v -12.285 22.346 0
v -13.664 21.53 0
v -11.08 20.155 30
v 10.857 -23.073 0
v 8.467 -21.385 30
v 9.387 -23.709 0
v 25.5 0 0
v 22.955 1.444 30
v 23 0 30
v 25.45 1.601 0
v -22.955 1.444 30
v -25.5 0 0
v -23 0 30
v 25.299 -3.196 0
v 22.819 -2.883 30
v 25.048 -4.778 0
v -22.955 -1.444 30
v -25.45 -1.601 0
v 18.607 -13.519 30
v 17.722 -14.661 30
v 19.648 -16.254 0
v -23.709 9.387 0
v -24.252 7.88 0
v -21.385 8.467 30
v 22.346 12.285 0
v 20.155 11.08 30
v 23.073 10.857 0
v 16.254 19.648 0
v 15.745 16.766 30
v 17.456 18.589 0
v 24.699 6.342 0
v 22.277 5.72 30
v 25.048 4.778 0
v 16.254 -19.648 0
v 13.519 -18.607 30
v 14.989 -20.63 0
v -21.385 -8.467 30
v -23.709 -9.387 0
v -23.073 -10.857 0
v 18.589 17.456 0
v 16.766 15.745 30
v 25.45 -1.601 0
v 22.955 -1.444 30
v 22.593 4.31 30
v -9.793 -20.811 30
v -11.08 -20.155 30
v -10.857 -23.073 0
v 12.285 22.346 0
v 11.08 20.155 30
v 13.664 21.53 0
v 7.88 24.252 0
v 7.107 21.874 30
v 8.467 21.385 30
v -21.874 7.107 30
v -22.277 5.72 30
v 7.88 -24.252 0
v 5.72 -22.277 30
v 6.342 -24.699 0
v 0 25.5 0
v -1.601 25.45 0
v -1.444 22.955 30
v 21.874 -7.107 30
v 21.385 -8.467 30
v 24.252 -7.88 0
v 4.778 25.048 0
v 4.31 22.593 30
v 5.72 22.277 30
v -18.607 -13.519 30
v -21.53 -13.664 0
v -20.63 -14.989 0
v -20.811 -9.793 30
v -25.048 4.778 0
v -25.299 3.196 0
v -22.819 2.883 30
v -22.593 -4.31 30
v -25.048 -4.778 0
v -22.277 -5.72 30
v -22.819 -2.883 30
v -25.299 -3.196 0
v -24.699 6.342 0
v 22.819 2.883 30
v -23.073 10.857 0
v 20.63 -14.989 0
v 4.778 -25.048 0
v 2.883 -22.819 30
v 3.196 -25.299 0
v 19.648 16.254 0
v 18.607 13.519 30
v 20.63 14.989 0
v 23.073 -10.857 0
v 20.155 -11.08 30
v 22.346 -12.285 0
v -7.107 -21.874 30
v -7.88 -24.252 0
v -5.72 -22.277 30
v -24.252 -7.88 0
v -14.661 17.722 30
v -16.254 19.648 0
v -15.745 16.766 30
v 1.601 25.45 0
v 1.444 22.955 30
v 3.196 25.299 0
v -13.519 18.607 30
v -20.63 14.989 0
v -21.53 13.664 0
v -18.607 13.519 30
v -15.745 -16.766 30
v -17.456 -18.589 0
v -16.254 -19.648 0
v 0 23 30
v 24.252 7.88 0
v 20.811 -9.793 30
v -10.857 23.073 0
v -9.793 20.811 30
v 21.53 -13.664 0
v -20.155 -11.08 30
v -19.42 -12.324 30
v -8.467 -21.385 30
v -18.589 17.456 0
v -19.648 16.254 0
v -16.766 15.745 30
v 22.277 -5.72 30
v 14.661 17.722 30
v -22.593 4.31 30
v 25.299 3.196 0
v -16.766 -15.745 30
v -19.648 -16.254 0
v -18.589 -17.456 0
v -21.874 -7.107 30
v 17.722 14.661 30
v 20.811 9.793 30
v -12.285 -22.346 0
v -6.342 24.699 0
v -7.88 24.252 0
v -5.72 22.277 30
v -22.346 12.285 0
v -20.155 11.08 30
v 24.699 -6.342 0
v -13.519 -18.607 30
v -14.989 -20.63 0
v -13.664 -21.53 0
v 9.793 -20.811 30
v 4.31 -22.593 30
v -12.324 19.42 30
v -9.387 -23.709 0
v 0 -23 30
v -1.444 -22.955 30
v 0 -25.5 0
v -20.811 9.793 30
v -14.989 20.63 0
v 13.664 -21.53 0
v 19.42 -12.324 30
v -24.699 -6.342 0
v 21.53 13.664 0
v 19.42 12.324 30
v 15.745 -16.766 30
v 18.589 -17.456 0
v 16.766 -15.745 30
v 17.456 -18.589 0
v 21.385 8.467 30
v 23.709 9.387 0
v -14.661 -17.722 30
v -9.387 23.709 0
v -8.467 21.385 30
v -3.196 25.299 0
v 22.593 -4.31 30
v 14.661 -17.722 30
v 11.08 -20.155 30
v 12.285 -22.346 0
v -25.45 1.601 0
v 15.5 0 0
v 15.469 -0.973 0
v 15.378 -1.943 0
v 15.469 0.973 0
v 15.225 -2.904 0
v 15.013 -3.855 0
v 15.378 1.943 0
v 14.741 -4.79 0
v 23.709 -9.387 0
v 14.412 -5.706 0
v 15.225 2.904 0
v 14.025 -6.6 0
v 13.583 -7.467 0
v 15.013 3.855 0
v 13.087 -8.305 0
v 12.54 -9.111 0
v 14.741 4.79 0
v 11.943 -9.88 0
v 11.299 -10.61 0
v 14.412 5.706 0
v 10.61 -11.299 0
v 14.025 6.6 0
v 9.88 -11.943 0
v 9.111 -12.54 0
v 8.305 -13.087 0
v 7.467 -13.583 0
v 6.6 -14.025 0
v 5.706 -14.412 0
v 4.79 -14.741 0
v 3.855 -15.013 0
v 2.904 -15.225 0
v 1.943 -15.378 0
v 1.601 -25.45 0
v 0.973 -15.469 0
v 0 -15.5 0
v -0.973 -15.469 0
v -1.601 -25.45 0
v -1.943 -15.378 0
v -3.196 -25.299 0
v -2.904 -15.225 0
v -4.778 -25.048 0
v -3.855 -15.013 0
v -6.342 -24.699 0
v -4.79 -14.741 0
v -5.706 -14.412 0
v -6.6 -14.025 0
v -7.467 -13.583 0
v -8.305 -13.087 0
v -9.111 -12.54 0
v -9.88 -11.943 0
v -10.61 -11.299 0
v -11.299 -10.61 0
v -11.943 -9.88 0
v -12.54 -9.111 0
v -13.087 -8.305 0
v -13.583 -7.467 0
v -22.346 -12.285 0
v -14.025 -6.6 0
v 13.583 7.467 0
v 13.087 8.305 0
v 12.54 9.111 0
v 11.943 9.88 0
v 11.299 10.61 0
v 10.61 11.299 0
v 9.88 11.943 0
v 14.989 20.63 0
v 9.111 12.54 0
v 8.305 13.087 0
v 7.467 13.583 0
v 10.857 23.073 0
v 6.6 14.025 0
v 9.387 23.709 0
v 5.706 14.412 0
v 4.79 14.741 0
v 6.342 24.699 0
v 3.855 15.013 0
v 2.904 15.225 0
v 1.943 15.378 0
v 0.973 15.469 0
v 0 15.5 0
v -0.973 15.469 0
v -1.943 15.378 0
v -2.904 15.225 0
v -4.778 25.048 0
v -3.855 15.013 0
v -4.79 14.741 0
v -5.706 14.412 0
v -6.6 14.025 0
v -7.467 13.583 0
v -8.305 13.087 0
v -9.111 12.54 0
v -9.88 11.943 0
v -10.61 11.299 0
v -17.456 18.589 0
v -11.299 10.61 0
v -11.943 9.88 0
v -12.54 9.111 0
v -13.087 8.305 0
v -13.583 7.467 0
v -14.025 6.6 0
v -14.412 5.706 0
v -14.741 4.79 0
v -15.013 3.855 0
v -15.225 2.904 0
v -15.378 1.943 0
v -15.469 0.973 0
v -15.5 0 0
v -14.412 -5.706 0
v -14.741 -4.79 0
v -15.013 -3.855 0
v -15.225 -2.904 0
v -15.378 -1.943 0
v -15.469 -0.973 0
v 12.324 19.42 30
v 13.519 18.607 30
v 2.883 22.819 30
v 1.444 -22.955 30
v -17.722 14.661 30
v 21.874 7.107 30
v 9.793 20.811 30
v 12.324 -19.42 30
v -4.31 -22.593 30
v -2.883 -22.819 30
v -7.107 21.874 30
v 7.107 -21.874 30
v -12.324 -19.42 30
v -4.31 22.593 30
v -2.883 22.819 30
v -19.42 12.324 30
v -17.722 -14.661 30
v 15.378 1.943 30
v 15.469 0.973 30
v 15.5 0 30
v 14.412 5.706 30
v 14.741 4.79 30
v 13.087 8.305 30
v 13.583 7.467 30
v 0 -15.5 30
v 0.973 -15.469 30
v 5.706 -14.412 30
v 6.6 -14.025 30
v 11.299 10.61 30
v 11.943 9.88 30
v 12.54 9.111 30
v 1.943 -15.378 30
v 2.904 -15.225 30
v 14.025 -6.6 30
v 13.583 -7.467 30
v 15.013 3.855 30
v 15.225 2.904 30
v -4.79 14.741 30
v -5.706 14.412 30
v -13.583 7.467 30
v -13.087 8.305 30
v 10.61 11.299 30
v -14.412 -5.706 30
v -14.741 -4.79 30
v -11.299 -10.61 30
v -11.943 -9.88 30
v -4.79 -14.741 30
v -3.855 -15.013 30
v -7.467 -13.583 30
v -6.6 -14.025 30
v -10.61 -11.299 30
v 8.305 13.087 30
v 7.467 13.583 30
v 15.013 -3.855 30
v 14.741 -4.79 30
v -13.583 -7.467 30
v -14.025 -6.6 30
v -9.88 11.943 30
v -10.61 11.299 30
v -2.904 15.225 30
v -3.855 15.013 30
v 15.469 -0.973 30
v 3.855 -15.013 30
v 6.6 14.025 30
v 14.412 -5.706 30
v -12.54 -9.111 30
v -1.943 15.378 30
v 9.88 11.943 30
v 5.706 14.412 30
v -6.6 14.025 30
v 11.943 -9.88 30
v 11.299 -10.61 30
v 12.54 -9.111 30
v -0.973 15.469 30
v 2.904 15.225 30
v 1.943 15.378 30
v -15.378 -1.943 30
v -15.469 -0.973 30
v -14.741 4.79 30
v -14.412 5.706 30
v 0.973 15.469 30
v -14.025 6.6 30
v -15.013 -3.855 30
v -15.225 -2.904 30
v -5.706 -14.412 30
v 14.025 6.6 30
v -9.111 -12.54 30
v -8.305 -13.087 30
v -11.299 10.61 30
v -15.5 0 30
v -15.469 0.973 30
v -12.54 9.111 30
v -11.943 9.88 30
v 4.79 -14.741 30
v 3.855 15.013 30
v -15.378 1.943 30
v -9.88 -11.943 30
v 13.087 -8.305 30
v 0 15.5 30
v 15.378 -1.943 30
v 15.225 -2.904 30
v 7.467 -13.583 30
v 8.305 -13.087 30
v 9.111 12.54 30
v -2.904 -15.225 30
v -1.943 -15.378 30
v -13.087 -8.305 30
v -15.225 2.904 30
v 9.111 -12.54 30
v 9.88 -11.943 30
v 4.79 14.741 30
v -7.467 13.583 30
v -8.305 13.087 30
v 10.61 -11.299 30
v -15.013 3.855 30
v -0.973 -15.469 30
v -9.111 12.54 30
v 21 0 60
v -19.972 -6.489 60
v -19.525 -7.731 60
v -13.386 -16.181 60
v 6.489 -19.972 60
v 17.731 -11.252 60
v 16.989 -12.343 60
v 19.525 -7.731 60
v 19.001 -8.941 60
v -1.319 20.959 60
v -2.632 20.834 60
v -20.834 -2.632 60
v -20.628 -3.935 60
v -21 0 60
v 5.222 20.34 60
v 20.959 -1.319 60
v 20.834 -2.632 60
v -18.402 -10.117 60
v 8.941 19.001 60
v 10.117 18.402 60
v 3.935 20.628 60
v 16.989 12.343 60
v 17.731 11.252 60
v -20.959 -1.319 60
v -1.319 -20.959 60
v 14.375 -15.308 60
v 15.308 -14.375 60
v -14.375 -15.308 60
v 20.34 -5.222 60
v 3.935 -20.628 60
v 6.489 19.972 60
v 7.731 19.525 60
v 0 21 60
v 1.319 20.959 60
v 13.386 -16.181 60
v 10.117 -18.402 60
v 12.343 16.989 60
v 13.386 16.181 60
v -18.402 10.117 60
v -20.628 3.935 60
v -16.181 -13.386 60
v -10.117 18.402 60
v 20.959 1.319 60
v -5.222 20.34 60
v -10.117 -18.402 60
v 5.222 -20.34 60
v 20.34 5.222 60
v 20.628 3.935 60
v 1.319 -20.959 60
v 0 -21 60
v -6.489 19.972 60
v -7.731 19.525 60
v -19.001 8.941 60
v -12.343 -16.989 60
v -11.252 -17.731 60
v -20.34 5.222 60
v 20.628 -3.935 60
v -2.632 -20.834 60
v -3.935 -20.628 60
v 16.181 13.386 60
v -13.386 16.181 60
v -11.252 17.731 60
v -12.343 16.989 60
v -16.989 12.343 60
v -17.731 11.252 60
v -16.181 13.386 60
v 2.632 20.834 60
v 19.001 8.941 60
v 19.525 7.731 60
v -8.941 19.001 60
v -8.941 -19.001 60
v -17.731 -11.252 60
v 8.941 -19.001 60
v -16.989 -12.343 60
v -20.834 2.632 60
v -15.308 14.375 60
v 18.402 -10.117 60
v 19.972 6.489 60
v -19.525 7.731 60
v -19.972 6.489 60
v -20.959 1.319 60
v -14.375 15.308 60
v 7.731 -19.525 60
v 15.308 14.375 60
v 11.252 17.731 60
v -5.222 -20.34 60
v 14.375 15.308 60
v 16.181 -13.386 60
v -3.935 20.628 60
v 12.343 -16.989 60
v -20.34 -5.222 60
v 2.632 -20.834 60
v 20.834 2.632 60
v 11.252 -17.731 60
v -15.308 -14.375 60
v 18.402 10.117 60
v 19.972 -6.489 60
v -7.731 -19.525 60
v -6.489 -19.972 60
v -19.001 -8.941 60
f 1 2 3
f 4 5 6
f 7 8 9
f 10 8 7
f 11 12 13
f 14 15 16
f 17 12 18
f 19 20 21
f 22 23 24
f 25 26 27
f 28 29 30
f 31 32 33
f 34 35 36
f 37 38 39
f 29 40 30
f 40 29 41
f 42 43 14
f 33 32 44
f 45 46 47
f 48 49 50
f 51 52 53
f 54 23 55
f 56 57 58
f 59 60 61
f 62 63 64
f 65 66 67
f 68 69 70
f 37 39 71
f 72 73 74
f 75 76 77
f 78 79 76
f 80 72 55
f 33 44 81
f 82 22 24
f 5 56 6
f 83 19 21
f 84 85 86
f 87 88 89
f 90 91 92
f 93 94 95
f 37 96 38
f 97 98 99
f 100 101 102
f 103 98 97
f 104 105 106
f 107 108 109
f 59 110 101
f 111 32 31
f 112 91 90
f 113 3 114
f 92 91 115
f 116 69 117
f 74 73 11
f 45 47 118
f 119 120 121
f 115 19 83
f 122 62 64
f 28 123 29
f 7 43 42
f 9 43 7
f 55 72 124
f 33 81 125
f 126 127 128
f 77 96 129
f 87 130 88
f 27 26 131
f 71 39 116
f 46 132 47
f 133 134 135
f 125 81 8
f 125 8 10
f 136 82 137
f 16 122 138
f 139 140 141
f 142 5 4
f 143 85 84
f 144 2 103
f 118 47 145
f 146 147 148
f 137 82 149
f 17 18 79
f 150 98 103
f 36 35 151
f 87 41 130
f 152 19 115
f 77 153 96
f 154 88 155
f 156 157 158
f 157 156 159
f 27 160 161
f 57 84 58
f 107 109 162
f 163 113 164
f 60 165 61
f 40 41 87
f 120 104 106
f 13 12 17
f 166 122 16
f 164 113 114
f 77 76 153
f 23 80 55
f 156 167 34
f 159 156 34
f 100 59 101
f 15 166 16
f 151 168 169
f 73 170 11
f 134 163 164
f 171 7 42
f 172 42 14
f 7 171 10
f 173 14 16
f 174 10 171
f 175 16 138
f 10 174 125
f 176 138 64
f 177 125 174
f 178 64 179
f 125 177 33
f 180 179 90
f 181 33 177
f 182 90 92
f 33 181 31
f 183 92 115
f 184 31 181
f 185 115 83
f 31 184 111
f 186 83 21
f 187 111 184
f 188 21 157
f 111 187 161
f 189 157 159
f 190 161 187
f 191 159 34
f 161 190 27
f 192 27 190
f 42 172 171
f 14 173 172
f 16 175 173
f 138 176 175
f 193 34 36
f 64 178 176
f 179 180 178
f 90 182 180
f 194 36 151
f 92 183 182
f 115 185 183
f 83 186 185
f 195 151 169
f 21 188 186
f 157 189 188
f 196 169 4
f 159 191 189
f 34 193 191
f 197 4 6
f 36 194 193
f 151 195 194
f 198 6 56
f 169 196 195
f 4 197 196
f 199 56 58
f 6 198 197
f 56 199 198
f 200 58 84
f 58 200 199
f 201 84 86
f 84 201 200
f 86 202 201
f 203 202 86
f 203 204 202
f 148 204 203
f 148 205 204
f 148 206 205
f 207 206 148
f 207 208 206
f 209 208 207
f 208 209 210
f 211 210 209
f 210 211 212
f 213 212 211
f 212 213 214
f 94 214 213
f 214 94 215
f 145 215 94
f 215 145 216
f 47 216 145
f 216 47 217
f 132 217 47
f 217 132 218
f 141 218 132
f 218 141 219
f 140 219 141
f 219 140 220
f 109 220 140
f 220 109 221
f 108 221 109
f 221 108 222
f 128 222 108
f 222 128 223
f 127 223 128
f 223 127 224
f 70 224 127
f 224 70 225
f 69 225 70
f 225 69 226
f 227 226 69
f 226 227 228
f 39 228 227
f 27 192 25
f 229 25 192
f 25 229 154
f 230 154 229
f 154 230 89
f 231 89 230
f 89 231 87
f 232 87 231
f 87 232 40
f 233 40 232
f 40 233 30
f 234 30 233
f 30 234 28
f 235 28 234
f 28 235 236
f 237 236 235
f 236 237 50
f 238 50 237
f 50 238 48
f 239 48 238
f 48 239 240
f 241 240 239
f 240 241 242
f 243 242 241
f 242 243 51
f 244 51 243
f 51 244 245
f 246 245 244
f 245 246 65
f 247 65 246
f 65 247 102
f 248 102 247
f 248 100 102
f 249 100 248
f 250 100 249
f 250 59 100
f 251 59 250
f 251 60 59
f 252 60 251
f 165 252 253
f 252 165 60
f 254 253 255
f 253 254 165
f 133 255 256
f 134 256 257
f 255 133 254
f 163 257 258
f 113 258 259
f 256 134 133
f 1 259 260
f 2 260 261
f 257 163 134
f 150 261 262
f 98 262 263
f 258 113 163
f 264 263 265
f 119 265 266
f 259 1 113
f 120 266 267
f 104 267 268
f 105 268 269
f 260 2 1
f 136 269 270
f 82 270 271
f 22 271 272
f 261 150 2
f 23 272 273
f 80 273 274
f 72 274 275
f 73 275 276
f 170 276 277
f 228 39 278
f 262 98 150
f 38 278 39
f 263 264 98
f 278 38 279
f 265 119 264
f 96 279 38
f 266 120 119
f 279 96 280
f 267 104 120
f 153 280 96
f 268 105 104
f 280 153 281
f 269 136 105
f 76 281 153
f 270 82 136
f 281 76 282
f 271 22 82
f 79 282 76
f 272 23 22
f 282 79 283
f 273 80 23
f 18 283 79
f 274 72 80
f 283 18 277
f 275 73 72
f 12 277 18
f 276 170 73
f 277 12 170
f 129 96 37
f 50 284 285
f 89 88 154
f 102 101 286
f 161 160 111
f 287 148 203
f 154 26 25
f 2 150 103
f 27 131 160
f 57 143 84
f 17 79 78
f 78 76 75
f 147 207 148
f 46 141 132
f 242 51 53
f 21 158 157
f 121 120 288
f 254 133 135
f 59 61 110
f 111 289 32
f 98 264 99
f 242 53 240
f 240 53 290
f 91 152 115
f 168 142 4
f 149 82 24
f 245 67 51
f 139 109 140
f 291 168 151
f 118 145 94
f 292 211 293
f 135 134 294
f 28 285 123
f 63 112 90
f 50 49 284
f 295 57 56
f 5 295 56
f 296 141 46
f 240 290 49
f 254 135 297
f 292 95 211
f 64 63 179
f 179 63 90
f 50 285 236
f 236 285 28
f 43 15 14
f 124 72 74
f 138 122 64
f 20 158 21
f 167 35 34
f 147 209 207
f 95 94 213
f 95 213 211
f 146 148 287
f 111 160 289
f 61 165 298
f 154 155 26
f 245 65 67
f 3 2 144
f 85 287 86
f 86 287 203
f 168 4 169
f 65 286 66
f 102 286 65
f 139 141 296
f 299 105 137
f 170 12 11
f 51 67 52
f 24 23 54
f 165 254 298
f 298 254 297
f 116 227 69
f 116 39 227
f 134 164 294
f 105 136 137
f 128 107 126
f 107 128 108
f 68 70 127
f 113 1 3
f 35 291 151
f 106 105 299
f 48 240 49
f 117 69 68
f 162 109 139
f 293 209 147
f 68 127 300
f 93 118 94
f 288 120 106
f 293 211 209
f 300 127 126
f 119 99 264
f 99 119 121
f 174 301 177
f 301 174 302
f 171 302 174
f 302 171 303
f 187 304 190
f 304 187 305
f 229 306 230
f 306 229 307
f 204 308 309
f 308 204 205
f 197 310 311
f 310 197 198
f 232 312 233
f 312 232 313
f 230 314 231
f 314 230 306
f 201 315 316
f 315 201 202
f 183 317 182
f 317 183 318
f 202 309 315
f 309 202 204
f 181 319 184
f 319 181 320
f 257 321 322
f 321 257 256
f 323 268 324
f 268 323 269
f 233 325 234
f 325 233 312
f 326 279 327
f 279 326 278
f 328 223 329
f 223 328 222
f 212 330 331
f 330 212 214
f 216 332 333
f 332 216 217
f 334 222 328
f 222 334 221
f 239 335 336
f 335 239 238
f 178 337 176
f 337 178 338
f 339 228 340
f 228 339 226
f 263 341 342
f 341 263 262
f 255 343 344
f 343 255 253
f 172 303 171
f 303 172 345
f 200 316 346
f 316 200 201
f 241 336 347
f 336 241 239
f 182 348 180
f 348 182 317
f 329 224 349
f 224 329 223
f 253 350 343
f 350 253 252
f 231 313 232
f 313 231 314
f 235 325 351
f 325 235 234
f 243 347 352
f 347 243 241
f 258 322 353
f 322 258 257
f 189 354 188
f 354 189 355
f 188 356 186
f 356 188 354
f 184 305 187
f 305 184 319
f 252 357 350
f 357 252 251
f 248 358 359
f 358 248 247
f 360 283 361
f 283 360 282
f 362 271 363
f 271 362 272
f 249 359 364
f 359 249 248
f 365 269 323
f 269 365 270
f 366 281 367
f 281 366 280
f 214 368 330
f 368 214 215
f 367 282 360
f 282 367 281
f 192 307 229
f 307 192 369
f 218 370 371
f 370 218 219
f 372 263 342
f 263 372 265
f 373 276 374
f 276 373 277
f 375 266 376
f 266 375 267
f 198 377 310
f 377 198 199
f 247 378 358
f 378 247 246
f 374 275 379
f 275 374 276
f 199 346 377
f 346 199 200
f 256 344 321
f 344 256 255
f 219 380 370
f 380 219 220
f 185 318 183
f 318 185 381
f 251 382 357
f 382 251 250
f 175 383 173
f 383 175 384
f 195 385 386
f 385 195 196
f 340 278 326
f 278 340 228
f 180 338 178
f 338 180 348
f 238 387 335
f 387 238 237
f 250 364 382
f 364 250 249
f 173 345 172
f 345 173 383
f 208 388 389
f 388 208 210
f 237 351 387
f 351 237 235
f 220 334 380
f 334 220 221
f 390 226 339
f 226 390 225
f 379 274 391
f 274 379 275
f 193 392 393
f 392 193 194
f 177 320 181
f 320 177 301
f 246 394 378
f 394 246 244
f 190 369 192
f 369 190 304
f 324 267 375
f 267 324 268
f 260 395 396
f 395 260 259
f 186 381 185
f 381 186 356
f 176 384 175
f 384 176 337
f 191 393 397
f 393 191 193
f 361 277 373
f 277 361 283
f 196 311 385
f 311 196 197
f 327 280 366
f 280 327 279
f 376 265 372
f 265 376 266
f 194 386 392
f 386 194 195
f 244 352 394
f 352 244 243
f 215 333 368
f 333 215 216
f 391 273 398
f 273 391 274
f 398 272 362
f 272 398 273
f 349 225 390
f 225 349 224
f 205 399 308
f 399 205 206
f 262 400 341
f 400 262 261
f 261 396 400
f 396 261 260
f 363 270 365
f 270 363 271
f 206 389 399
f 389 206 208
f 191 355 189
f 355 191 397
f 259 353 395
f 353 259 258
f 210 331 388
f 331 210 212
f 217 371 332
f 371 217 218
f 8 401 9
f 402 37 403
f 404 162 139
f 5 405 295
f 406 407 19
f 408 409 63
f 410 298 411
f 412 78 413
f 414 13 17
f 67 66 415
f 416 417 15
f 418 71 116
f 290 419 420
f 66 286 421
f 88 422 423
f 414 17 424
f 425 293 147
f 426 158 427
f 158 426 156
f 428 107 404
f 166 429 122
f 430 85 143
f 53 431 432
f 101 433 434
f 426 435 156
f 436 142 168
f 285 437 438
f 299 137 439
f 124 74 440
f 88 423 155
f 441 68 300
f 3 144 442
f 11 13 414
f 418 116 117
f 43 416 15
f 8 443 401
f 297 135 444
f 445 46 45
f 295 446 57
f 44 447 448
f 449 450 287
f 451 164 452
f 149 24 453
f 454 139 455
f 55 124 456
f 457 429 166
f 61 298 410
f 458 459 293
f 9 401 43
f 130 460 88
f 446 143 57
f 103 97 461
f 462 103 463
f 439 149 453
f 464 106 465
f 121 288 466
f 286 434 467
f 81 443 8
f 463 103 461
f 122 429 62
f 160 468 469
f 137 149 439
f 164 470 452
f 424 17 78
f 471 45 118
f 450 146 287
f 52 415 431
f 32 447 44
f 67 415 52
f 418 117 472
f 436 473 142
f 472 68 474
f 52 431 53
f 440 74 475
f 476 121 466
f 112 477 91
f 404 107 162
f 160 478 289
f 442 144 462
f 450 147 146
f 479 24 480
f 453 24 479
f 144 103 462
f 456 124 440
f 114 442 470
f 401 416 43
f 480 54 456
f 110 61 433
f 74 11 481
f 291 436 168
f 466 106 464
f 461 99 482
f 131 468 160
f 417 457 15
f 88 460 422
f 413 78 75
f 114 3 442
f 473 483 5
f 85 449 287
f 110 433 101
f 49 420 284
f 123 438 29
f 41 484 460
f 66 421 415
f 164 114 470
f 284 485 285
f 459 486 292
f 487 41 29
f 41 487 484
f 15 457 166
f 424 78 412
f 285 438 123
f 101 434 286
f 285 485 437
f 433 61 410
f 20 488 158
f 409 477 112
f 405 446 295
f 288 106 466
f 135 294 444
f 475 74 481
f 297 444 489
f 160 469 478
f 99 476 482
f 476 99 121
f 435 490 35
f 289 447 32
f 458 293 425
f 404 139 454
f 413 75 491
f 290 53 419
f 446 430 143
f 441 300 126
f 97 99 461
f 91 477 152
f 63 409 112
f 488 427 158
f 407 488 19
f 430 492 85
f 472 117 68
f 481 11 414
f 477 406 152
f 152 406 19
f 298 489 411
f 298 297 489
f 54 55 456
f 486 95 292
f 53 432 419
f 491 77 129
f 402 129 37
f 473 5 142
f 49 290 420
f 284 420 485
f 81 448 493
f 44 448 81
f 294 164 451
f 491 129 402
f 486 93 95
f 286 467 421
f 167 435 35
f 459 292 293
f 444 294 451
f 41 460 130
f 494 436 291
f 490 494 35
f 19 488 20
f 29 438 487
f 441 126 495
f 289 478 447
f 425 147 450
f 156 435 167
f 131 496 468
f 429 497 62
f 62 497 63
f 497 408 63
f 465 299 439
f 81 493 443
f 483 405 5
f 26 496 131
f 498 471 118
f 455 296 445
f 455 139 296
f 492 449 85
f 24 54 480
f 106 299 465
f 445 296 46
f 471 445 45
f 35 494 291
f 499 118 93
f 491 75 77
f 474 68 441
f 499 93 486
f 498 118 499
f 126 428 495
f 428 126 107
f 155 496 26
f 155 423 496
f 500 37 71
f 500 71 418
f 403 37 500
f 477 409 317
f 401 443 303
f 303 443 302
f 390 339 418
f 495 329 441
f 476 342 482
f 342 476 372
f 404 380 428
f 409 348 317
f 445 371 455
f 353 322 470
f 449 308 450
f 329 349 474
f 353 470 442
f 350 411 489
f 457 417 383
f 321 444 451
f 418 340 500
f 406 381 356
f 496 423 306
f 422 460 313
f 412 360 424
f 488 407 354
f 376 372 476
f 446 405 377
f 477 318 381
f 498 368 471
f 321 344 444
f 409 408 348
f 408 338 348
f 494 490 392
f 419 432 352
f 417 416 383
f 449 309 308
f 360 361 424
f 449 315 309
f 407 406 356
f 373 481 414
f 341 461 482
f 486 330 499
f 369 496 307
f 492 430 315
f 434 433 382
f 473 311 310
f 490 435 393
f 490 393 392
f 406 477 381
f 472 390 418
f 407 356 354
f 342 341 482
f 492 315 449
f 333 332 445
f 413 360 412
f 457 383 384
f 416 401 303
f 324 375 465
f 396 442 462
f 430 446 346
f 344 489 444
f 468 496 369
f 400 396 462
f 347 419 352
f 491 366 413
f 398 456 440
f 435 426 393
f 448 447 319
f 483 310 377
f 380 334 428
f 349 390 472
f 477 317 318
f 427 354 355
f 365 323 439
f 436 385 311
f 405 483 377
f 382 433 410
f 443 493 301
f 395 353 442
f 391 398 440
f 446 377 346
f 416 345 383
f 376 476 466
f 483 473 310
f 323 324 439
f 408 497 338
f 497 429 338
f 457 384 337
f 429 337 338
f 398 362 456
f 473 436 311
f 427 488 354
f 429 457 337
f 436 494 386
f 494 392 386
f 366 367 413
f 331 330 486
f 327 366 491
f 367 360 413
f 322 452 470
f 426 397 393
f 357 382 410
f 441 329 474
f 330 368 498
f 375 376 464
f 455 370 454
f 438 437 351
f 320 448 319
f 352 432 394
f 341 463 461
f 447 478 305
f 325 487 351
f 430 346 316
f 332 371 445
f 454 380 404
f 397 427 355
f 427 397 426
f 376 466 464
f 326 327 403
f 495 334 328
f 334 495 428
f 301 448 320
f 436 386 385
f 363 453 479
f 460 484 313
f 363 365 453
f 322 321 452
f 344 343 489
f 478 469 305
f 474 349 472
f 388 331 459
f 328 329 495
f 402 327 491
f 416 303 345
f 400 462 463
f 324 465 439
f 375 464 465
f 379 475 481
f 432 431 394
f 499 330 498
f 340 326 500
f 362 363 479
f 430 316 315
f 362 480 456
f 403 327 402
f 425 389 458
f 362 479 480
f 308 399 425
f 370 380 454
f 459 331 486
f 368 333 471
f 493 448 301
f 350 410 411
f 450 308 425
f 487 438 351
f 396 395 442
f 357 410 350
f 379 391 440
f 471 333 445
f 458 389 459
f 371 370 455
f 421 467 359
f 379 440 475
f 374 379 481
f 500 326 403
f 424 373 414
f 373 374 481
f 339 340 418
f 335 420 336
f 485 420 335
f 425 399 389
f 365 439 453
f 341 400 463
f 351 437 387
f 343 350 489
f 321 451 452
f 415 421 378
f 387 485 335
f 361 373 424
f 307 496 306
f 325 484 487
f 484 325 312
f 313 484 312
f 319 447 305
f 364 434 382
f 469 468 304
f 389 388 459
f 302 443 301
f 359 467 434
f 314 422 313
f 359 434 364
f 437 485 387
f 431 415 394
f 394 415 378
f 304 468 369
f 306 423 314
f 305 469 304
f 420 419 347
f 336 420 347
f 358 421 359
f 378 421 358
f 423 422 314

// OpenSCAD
/*
Version=2.0
*/
outerDiameter1 = 46;
outerDiameter2 = 51.0;

innerDiameter1 = 31.0;
innerDiameter2 = 31.0;

outerDiameter3 = outerDiameter1;
outerDiameter4 = 42;

innerDiameter3 = 31.0;
innerDiameter4 = outerDiameter4;

height = 30;

module tube(h, od1, od2, id1, id2)
{
    difference()
    {
        cylinder(h=h, d1=od1, d2=od2, center=false, $fn=100);
        cylinder(h=h, d1=id1, d2=id2, center=false, $fn=100);
    }
}

union()
{
    tube(height, outerDiameter2, outerDiameter1, innerDiameter2,innerDiameter1);
    
    translate([0,0,height])
    tube(height, outerDiameter3, outerDiameter4, innerDiameter3,innerDiameter4);
}
